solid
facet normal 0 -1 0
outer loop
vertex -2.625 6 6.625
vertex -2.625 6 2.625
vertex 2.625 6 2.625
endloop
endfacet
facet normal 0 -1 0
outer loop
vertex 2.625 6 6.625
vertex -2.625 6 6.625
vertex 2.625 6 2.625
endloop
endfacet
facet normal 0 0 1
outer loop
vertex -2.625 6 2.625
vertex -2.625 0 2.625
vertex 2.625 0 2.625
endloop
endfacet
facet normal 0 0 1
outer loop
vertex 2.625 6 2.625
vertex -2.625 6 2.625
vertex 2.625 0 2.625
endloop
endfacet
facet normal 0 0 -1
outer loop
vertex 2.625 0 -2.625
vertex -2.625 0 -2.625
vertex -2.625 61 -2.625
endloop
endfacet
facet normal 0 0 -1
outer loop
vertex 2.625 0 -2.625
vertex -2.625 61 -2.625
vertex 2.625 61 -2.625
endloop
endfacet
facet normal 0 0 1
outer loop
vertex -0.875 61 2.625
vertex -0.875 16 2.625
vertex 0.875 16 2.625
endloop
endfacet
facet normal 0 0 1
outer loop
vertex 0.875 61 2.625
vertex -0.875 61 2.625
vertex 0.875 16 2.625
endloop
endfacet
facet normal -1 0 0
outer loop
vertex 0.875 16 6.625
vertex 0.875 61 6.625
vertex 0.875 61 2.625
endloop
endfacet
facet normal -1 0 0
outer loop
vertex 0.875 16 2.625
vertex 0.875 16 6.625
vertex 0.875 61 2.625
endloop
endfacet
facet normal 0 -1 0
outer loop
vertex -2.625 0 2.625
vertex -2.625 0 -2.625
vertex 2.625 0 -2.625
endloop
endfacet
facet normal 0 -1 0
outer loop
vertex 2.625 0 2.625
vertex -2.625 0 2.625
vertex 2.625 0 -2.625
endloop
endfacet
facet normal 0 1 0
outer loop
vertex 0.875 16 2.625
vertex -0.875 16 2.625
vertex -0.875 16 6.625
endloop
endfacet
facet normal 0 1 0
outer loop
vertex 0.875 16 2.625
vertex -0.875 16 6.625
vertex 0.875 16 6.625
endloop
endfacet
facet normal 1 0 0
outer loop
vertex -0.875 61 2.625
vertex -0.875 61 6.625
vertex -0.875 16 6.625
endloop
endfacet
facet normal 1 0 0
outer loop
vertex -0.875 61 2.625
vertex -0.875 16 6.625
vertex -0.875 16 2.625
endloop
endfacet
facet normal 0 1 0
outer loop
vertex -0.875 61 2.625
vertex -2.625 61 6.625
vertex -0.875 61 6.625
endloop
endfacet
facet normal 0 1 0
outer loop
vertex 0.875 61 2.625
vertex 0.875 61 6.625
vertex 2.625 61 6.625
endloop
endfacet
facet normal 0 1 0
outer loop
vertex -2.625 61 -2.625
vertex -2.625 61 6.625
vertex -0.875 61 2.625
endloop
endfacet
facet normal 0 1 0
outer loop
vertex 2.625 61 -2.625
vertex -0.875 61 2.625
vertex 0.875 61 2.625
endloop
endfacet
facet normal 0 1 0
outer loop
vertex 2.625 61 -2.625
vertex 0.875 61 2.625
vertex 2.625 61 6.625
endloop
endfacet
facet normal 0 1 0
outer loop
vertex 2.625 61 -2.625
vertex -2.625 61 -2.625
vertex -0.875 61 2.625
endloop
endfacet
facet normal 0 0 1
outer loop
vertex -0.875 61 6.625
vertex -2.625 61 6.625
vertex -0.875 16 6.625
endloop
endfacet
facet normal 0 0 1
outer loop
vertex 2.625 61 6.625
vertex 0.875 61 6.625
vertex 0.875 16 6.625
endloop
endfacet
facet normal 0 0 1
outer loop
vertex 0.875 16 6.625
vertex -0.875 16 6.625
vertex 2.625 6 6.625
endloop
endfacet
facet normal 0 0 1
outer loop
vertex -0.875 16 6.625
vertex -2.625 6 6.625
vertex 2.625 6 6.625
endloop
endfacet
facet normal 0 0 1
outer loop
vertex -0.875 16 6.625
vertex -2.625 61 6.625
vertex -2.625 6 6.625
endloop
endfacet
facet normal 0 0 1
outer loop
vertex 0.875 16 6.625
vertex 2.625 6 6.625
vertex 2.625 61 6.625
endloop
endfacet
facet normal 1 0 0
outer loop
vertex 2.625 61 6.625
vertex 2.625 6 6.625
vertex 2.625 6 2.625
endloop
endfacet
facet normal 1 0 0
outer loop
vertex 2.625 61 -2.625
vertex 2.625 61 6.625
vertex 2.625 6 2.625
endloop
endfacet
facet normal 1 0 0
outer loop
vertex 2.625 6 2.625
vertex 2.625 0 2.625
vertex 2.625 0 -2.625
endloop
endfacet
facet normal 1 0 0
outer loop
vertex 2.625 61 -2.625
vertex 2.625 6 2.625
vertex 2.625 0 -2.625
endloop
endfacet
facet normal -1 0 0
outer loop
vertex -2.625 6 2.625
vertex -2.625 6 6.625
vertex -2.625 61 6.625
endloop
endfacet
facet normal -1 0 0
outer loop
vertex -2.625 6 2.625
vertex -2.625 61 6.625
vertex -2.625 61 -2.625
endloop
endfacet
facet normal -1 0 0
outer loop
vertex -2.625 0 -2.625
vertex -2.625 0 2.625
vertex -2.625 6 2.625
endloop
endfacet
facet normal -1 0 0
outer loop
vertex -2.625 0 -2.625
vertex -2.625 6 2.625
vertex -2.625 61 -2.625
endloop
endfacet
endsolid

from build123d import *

# Parameters (mm, degrees)
SKETCH1_W           = 5.25
SKETCH1_H           = 5.25
BOSS_EXTRUDE1_DEPTH = 6
SKETCH2_W           = 5.25
SKETCH2_H           = 9.25
BOSS_EXTRUDE2_DEPTH = 55
SKETCH3_W           = 1.75
SKETCH3_H           = 8
CUT_EXTRUDE1_DEPTH  = 45


with BuildPart() as part:
    # Sketch1 → Boss-Extrude1 (new body)
    with BuildSketch(Plane(origin=(0, 0, 0), x_dir=(1, 0, 0), z_dir=(0, 1, 0))):
        Rectangle(SKETCH1_W, SKETCH1_H)
    extrude(amount=BOSS_EXTRUDE1_DEPTH)

    # Sketch2 → Boss-Extrude2 (add)
    with BuildSketch(Plane(origin=(0, 6, 0), x_dir=(1, 0, 0), z_dir=(0, 1, 0))):
        with Locations((0, -2)):
            Rectangle(SKETCH2_W, SKETCH2_H)
    extrude(amount=BOSS_EXTRUDE2_DEPTH)

    # Sketch3 → Cut-Extrude1 (cut)
    with BuildSketch(Plane(origin=(0, 61, 0), x_dir=(1, 0, 0), z_dir=(0, 1, 0))):
        with Locations((0, -6.625)):
            Rectangle(SKETCH3_W, SKETCH3_H)
    extrude(amount=-CUT_EXTRUDE1_DEPTH, mode=Mode.SUBTRACT)


solid = part.part
